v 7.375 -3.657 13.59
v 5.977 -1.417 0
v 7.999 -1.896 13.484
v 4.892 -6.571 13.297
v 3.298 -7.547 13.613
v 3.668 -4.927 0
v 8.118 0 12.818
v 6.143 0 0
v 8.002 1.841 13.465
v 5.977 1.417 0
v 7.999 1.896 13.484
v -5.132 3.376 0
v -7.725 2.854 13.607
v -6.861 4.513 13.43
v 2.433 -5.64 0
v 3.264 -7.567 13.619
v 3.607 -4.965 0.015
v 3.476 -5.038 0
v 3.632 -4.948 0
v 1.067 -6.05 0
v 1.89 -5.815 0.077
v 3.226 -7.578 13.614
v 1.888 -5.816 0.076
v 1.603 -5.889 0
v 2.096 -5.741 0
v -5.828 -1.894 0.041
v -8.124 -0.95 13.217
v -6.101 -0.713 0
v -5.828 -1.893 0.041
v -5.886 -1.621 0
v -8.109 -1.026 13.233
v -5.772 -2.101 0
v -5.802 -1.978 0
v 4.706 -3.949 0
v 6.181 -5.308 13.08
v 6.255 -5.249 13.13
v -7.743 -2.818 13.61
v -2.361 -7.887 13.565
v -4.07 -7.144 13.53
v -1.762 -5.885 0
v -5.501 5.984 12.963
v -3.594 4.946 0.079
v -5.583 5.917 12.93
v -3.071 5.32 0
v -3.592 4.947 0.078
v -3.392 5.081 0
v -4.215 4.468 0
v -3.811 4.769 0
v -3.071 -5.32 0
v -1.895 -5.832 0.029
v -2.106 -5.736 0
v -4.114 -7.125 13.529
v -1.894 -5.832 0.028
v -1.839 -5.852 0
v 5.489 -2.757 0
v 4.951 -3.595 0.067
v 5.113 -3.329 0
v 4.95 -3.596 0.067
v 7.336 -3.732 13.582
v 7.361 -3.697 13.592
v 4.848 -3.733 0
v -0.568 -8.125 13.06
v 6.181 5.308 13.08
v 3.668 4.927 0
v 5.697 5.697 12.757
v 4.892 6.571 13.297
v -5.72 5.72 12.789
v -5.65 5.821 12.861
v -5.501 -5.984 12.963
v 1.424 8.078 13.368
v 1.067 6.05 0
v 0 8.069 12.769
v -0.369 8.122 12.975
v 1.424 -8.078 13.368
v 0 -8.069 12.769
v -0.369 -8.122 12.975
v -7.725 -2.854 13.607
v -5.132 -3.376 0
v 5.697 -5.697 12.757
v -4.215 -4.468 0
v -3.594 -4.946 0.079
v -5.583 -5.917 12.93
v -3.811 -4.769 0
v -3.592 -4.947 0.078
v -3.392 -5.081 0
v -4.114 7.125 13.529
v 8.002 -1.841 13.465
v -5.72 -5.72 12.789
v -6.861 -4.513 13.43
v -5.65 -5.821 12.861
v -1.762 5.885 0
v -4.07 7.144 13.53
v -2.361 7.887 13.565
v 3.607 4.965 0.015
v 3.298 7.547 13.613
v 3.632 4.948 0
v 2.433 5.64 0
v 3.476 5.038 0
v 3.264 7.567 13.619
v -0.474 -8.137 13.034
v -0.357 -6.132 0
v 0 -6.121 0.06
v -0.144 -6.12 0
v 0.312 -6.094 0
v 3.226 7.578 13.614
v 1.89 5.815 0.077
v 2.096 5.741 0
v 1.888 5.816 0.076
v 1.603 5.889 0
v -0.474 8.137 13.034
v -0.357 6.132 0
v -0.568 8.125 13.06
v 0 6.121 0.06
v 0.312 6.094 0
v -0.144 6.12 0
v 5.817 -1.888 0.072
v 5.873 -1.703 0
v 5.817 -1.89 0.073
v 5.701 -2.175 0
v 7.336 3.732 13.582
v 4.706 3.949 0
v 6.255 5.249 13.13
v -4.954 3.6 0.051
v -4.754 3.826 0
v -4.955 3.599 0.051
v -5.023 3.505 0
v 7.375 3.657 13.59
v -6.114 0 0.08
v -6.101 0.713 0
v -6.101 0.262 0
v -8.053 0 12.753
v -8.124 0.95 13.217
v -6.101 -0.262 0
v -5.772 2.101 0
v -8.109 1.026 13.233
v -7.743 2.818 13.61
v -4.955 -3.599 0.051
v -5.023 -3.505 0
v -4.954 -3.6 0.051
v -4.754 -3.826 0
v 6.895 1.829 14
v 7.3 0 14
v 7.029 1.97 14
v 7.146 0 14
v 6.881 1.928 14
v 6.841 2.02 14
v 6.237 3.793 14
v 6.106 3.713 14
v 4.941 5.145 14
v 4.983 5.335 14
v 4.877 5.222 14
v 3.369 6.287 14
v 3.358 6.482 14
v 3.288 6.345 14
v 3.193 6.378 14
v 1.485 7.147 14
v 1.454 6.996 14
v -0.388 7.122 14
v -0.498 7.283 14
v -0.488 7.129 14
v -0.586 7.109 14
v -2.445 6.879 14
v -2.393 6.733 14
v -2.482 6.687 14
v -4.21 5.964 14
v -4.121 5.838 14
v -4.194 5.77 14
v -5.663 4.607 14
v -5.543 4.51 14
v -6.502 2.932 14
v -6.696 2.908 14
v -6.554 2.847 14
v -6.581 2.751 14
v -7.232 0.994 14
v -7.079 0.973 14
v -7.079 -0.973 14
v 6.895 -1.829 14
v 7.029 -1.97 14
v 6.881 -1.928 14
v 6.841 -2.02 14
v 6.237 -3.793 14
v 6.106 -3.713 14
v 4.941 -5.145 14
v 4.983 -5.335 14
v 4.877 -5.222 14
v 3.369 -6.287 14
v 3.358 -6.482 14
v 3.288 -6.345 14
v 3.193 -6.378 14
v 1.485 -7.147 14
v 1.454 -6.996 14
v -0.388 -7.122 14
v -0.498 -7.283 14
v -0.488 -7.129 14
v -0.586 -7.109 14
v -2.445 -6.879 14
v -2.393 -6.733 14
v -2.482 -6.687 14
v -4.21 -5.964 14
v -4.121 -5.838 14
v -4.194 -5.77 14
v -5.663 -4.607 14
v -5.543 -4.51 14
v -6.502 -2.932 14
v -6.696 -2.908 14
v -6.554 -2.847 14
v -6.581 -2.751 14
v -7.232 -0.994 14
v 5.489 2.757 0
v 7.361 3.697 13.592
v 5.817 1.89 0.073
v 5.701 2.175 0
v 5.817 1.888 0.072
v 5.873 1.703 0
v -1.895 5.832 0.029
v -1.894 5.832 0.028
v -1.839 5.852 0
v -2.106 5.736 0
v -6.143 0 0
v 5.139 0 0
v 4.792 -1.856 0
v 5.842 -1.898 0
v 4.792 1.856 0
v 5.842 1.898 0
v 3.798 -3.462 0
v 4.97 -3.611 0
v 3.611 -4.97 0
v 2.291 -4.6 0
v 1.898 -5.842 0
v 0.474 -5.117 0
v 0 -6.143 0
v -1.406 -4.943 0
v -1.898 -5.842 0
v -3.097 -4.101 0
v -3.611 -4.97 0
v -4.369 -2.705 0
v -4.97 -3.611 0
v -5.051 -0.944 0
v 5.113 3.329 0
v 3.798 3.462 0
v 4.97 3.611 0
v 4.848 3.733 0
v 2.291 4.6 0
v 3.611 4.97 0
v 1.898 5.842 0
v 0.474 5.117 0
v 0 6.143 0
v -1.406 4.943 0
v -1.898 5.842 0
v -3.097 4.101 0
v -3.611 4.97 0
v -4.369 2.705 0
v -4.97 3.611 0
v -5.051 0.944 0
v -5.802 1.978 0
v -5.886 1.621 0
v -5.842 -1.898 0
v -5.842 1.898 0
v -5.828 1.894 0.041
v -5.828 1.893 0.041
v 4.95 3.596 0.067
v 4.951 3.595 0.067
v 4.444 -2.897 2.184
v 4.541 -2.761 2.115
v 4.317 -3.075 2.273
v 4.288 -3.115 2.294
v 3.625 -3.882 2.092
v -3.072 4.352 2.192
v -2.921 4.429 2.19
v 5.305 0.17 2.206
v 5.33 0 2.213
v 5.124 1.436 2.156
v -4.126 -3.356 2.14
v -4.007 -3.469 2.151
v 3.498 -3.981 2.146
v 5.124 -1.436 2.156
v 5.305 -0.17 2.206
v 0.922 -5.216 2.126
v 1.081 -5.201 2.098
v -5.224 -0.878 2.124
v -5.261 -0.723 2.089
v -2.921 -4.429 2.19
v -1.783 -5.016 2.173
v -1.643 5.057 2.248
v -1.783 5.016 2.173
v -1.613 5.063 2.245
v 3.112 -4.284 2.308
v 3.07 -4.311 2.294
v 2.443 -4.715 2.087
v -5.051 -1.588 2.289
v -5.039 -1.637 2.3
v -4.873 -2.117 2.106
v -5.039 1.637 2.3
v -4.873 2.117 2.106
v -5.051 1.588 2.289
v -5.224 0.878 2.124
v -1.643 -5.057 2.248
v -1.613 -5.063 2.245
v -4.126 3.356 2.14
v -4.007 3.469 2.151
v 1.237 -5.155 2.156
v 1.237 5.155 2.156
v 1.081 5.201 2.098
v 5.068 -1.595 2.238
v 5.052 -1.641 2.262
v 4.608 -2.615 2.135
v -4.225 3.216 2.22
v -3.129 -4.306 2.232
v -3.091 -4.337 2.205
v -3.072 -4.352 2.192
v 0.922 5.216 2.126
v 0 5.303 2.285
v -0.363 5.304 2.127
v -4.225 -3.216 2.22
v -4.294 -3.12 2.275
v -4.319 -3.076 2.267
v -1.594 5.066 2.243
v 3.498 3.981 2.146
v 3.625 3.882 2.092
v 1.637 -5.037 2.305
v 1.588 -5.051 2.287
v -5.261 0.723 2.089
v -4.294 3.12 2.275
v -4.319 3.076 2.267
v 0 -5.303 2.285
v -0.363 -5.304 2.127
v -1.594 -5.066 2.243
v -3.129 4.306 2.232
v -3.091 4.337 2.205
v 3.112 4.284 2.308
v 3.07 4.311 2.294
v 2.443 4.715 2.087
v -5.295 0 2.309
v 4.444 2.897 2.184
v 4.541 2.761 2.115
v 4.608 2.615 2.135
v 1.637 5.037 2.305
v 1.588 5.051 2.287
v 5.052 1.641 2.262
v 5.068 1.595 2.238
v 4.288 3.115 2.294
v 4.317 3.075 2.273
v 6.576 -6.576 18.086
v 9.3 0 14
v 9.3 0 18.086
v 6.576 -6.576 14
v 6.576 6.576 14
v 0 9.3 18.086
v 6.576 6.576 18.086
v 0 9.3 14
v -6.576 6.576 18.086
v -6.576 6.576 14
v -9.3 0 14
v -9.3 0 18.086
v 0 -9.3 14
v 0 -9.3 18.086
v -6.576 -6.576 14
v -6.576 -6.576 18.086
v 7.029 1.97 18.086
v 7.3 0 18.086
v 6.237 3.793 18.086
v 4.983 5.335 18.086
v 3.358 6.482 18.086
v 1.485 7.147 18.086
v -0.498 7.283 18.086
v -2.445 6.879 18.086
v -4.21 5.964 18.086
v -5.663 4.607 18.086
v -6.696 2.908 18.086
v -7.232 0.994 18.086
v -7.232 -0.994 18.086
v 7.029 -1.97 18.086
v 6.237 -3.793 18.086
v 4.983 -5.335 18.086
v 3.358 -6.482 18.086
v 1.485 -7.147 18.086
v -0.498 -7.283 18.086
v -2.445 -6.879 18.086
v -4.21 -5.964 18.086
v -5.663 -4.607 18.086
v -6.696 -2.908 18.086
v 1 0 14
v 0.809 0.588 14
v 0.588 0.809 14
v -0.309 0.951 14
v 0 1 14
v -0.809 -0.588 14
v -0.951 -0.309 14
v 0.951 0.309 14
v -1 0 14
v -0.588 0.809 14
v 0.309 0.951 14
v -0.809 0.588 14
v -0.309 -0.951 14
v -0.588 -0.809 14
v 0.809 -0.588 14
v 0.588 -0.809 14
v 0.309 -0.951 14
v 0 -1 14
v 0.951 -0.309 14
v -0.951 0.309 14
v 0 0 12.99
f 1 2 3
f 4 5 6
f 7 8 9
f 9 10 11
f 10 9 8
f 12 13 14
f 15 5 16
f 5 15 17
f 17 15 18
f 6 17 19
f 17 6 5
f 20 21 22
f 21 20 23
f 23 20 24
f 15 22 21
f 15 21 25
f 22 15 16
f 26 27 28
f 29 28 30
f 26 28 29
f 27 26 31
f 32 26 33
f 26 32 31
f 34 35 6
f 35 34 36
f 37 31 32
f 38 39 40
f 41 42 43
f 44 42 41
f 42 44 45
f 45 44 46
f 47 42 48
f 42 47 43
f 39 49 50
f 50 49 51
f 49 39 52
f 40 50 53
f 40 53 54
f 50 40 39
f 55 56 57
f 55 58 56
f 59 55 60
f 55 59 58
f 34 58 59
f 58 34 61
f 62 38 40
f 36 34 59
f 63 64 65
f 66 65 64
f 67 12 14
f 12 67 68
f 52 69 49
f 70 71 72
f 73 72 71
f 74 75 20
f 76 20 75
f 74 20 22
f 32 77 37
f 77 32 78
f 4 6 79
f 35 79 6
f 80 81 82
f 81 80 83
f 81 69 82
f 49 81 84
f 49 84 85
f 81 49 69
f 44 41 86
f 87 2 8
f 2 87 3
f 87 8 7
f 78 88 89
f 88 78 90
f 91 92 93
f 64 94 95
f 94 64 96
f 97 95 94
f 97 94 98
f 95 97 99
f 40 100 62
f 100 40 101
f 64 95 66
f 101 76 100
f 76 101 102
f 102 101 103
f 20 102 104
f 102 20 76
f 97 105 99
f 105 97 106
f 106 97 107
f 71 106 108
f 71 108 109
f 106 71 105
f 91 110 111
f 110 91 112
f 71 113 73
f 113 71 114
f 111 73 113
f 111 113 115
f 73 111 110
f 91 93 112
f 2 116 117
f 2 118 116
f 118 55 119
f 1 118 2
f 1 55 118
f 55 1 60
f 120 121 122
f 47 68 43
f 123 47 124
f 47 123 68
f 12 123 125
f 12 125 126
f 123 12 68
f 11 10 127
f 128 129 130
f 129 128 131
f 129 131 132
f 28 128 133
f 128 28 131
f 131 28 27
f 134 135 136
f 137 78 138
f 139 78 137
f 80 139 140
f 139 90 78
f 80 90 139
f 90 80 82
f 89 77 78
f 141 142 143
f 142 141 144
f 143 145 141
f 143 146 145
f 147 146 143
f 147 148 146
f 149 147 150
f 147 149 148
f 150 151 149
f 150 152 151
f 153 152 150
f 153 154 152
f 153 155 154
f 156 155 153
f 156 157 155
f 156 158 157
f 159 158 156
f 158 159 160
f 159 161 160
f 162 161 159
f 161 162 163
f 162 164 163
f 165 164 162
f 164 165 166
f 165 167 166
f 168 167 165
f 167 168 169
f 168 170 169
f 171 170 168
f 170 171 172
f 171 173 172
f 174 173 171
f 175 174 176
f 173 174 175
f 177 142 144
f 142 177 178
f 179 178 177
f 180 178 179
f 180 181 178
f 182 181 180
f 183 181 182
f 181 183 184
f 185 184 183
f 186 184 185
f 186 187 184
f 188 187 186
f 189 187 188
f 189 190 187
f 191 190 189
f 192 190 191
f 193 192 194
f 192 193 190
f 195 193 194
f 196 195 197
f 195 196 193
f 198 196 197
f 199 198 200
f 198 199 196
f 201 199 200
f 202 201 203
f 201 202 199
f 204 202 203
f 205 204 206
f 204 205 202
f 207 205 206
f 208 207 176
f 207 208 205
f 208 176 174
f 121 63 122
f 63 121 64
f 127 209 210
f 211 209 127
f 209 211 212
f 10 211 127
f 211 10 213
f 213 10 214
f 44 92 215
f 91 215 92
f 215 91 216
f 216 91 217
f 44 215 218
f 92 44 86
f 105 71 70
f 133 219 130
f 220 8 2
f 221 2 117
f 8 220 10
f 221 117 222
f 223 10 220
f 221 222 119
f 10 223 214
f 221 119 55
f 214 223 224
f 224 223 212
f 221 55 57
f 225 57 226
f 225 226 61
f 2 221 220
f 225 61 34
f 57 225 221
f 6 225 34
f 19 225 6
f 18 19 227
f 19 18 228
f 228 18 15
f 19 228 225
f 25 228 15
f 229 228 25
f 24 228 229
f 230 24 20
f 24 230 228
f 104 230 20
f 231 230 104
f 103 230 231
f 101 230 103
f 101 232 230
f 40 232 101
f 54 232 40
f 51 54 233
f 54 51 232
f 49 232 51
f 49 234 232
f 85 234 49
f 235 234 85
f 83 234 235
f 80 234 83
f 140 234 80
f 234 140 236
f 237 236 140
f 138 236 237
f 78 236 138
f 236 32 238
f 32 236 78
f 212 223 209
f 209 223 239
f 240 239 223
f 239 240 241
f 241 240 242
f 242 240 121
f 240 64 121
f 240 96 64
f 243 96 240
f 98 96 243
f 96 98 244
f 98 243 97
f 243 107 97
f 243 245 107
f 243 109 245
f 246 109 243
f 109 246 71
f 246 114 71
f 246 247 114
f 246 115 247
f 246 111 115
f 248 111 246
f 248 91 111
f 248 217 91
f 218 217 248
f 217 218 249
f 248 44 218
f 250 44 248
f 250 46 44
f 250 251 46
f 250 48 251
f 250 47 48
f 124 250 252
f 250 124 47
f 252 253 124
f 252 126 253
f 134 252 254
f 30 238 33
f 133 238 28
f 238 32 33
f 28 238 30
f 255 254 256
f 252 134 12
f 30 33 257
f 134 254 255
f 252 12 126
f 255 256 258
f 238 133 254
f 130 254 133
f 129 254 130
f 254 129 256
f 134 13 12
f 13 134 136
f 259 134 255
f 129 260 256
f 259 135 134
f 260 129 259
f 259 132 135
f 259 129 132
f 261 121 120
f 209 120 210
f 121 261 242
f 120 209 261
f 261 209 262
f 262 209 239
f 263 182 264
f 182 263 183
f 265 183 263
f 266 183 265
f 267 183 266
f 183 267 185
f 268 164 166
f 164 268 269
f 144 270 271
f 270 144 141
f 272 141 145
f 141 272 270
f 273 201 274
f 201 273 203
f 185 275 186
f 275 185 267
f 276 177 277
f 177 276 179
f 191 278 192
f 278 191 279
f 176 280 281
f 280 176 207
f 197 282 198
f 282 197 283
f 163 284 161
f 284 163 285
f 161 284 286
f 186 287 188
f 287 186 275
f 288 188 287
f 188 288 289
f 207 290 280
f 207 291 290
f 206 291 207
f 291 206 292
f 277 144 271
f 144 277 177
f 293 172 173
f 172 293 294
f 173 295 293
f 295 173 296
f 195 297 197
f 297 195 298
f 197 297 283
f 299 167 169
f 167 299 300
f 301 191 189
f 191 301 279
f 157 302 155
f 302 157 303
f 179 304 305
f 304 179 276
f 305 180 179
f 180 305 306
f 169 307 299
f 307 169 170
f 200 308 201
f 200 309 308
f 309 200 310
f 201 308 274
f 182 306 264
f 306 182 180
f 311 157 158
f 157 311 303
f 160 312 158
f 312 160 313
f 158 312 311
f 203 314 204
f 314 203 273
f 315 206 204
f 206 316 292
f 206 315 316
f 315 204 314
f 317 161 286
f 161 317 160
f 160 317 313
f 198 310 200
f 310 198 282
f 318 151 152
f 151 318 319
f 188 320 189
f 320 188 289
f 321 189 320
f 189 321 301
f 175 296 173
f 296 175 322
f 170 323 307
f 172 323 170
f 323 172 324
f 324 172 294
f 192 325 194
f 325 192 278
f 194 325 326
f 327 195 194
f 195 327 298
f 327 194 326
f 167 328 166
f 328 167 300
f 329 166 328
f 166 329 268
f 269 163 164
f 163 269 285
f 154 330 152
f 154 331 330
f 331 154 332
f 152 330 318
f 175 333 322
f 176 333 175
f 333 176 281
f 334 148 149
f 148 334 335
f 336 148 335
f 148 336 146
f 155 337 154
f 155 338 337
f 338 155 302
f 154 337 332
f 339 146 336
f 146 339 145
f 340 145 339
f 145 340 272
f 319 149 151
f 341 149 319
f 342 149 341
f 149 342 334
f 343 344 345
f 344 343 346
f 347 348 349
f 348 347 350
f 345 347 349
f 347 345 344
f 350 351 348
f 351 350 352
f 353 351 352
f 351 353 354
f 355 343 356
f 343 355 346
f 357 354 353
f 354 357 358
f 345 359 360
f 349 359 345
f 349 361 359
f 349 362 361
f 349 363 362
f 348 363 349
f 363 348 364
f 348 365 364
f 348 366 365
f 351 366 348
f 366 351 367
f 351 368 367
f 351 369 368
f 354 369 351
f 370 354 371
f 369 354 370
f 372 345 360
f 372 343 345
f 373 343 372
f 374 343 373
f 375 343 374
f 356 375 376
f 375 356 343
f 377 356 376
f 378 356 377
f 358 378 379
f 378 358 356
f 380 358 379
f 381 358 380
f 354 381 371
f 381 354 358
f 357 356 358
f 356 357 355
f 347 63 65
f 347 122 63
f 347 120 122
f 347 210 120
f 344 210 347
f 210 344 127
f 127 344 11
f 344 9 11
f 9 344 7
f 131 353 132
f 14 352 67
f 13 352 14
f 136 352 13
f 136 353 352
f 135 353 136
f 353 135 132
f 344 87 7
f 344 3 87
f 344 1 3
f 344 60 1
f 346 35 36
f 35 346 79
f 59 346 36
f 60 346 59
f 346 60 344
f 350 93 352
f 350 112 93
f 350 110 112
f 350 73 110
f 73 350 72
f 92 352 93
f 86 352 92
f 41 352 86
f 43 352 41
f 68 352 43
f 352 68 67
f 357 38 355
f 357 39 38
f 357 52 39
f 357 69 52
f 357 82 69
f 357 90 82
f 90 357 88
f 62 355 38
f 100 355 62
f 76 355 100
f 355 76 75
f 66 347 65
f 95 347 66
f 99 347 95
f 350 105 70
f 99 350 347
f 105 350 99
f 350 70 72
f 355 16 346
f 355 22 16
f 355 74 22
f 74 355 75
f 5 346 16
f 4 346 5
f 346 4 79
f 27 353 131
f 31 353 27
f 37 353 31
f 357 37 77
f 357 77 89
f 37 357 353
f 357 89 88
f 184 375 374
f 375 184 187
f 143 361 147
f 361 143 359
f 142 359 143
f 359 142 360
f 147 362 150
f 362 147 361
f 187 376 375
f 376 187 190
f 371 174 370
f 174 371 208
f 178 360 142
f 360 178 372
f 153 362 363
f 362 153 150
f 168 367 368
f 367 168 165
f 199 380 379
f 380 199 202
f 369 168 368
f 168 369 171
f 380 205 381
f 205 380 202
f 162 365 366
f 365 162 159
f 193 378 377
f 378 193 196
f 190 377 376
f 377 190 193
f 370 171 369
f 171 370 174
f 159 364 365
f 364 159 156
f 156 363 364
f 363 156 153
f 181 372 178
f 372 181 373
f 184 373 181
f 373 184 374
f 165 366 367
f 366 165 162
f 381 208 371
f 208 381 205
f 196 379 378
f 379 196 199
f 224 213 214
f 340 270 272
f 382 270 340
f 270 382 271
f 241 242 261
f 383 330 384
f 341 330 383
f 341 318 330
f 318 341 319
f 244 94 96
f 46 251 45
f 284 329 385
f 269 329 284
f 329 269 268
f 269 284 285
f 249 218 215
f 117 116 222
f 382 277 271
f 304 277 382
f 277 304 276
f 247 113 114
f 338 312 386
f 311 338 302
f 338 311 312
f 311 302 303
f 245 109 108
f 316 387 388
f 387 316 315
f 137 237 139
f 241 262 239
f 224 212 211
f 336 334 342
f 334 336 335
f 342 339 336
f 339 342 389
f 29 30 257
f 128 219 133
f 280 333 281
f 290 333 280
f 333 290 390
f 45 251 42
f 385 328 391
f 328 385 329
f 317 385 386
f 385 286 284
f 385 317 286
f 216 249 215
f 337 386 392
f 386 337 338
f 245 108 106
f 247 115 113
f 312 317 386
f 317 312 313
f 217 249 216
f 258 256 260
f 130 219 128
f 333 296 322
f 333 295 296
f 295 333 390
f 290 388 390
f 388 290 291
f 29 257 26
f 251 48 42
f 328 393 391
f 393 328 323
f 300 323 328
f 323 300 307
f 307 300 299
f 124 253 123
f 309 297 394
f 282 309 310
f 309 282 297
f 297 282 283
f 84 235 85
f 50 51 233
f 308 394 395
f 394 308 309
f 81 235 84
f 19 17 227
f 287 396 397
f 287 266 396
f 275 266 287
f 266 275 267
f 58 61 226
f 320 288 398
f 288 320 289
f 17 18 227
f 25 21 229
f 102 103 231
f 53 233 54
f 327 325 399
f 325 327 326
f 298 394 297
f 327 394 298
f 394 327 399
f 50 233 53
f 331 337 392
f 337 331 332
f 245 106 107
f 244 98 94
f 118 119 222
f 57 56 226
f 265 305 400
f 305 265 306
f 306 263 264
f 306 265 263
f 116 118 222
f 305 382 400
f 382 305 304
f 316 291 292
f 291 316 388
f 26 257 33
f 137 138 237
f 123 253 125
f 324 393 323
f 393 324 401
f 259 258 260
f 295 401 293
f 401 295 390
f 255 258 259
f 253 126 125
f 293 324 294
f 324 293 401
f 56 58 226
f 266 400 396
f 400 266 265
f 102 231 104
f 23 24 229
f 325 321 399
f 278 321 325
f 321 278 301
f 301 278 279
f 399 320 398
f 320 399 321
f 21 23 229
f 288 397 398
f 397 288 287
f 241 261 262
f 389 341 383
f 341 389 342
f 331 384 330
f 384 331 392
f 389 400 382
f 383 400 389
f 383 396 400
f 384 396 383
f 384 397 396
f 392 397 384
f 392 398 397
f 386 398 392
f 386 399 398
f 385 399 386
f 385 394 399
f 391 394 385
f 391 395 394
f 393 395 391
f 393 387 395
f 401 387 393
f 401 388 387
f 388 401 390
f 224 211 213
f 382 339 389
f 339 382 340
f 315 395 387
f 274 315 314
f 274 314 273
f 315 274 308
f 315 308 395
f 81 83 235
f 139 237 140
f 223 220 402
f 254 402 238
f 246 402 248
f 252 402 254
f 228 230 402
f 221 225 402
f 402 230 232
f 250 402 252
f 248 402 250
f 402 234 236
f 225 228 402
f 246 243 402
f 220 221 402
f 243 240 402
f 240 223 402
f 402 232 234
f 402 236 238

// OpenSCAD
// [FL_INDEX: keywords="openscad, 3d_parametric, Customizable_Flashlight_Diffuser_Cap, csg_solid" | COT="Parametric OpenSCAD design from 3DCodeverse"]
// Title: Customizable Flashlight Diffuser Cap

//Diameter of the flashlight barrel
BarrelDiameter=14.4; //mm
//Height of the diffuser portion, half barrel diameter makes a good diffuser, twice barrel diameter makes a signal wand...
CapHeight=14;
WallThickness=1; //mm
//Adjustment margin for your printer.
Margin=0.2; //mm
//Cut a cone out of the tip
DoCutout=1;//[0:No,1:Yes]
//Cut a notch out of the side-wall for a lanyard (attached to the flashlight)
NotchWidth=0;//[0:5]
//Cut out a hole to attach a lanyard to the tip itself
LanyardHole=0;//[0:5]
/* [Hidden] */
TipDiameter=BarrelDiameter*10/14; //mm
GripHeight=BarrelDiameter*3/14; //mm
NotchHeight=0.5;//[1:5]
// Facets in the anti-roll portion of the grip.
AntiRoll=8;

difference(){
 union(){
   //Cone Portion:
   difference(){
    cylinder(r1=TipDiameter/2+WallThickness, r2=(BarrelDiameter+Margin)/2+WallThickness,h=CapHeight);
    translate([0,0,WallThickness]) cylinder(r1=TipDiameter/2, r2=(BarrelDiameter+Margin)/2, h=CapHeight);
   }
   //Barrel Grip Portion:
   translate([0,0,CapHeight])
    difference(){
     union(){
      cylinder(r=(BarrelDiameter+Margin)/2+2*WallThickness, h=GripHeight+1, $fn=AntiRoll);
      translate([0,0,-1*((BarrelDiameter+Margin)/2+2*WallThickness)]) cylinder(r2=(BarrelDiameter+Margin)/2+2*WallThickness,r1=0,h=(BarrelDiameter+Margin)/2+2*WallThickness,$fn=AntiRoll);
     }
     translate([0,0,0]) cylinder(r=(BarrelDiameter+Margin)/2, h=GripHeight*10,center=true);
    }
  //Central, light-reflecting cone
  translate([0,0,0]) cylinder(r1=TipDiameter/2+WallThickness, r2=WallThickness, h=CapHeight);
 }
 if ( DoCutout ) translate([0,0,-0.01]) cylinder(r1=TipDiameter/2, r2=0, h=CapHeight-1);
 if ( NotchWidth ) {
  #translate([0,BarrelDiameter/2+WallThickness/2,CapHeight+GripHeight+NotchHeight])
   hull(){
    translate([0,0,NotchHeight]) rotate([90,0,0]) cylinder(r=NotchWidth/2,h=WallThickness*2,$fn=6, center=true);
    translate([0,0,-NotchHeight]) rotate([90,0,0]) cylinder(r=NotchWidth/2,h=WallThickness*2,$fn=6, center=true);
   }
 }
 if ( LanyardHole ){
  # translate([0,-BarrelDiameter/2+WallThickness/2,CapHeight+GripHeight-LanyardHole/2]) rotate([90,22.5,0]) cylinder(r=LanyardHole/2,h=WallThickness*2,$fn=8);
 }
 //translate([-50,-50,30]) cube([100,100,100]);
}
